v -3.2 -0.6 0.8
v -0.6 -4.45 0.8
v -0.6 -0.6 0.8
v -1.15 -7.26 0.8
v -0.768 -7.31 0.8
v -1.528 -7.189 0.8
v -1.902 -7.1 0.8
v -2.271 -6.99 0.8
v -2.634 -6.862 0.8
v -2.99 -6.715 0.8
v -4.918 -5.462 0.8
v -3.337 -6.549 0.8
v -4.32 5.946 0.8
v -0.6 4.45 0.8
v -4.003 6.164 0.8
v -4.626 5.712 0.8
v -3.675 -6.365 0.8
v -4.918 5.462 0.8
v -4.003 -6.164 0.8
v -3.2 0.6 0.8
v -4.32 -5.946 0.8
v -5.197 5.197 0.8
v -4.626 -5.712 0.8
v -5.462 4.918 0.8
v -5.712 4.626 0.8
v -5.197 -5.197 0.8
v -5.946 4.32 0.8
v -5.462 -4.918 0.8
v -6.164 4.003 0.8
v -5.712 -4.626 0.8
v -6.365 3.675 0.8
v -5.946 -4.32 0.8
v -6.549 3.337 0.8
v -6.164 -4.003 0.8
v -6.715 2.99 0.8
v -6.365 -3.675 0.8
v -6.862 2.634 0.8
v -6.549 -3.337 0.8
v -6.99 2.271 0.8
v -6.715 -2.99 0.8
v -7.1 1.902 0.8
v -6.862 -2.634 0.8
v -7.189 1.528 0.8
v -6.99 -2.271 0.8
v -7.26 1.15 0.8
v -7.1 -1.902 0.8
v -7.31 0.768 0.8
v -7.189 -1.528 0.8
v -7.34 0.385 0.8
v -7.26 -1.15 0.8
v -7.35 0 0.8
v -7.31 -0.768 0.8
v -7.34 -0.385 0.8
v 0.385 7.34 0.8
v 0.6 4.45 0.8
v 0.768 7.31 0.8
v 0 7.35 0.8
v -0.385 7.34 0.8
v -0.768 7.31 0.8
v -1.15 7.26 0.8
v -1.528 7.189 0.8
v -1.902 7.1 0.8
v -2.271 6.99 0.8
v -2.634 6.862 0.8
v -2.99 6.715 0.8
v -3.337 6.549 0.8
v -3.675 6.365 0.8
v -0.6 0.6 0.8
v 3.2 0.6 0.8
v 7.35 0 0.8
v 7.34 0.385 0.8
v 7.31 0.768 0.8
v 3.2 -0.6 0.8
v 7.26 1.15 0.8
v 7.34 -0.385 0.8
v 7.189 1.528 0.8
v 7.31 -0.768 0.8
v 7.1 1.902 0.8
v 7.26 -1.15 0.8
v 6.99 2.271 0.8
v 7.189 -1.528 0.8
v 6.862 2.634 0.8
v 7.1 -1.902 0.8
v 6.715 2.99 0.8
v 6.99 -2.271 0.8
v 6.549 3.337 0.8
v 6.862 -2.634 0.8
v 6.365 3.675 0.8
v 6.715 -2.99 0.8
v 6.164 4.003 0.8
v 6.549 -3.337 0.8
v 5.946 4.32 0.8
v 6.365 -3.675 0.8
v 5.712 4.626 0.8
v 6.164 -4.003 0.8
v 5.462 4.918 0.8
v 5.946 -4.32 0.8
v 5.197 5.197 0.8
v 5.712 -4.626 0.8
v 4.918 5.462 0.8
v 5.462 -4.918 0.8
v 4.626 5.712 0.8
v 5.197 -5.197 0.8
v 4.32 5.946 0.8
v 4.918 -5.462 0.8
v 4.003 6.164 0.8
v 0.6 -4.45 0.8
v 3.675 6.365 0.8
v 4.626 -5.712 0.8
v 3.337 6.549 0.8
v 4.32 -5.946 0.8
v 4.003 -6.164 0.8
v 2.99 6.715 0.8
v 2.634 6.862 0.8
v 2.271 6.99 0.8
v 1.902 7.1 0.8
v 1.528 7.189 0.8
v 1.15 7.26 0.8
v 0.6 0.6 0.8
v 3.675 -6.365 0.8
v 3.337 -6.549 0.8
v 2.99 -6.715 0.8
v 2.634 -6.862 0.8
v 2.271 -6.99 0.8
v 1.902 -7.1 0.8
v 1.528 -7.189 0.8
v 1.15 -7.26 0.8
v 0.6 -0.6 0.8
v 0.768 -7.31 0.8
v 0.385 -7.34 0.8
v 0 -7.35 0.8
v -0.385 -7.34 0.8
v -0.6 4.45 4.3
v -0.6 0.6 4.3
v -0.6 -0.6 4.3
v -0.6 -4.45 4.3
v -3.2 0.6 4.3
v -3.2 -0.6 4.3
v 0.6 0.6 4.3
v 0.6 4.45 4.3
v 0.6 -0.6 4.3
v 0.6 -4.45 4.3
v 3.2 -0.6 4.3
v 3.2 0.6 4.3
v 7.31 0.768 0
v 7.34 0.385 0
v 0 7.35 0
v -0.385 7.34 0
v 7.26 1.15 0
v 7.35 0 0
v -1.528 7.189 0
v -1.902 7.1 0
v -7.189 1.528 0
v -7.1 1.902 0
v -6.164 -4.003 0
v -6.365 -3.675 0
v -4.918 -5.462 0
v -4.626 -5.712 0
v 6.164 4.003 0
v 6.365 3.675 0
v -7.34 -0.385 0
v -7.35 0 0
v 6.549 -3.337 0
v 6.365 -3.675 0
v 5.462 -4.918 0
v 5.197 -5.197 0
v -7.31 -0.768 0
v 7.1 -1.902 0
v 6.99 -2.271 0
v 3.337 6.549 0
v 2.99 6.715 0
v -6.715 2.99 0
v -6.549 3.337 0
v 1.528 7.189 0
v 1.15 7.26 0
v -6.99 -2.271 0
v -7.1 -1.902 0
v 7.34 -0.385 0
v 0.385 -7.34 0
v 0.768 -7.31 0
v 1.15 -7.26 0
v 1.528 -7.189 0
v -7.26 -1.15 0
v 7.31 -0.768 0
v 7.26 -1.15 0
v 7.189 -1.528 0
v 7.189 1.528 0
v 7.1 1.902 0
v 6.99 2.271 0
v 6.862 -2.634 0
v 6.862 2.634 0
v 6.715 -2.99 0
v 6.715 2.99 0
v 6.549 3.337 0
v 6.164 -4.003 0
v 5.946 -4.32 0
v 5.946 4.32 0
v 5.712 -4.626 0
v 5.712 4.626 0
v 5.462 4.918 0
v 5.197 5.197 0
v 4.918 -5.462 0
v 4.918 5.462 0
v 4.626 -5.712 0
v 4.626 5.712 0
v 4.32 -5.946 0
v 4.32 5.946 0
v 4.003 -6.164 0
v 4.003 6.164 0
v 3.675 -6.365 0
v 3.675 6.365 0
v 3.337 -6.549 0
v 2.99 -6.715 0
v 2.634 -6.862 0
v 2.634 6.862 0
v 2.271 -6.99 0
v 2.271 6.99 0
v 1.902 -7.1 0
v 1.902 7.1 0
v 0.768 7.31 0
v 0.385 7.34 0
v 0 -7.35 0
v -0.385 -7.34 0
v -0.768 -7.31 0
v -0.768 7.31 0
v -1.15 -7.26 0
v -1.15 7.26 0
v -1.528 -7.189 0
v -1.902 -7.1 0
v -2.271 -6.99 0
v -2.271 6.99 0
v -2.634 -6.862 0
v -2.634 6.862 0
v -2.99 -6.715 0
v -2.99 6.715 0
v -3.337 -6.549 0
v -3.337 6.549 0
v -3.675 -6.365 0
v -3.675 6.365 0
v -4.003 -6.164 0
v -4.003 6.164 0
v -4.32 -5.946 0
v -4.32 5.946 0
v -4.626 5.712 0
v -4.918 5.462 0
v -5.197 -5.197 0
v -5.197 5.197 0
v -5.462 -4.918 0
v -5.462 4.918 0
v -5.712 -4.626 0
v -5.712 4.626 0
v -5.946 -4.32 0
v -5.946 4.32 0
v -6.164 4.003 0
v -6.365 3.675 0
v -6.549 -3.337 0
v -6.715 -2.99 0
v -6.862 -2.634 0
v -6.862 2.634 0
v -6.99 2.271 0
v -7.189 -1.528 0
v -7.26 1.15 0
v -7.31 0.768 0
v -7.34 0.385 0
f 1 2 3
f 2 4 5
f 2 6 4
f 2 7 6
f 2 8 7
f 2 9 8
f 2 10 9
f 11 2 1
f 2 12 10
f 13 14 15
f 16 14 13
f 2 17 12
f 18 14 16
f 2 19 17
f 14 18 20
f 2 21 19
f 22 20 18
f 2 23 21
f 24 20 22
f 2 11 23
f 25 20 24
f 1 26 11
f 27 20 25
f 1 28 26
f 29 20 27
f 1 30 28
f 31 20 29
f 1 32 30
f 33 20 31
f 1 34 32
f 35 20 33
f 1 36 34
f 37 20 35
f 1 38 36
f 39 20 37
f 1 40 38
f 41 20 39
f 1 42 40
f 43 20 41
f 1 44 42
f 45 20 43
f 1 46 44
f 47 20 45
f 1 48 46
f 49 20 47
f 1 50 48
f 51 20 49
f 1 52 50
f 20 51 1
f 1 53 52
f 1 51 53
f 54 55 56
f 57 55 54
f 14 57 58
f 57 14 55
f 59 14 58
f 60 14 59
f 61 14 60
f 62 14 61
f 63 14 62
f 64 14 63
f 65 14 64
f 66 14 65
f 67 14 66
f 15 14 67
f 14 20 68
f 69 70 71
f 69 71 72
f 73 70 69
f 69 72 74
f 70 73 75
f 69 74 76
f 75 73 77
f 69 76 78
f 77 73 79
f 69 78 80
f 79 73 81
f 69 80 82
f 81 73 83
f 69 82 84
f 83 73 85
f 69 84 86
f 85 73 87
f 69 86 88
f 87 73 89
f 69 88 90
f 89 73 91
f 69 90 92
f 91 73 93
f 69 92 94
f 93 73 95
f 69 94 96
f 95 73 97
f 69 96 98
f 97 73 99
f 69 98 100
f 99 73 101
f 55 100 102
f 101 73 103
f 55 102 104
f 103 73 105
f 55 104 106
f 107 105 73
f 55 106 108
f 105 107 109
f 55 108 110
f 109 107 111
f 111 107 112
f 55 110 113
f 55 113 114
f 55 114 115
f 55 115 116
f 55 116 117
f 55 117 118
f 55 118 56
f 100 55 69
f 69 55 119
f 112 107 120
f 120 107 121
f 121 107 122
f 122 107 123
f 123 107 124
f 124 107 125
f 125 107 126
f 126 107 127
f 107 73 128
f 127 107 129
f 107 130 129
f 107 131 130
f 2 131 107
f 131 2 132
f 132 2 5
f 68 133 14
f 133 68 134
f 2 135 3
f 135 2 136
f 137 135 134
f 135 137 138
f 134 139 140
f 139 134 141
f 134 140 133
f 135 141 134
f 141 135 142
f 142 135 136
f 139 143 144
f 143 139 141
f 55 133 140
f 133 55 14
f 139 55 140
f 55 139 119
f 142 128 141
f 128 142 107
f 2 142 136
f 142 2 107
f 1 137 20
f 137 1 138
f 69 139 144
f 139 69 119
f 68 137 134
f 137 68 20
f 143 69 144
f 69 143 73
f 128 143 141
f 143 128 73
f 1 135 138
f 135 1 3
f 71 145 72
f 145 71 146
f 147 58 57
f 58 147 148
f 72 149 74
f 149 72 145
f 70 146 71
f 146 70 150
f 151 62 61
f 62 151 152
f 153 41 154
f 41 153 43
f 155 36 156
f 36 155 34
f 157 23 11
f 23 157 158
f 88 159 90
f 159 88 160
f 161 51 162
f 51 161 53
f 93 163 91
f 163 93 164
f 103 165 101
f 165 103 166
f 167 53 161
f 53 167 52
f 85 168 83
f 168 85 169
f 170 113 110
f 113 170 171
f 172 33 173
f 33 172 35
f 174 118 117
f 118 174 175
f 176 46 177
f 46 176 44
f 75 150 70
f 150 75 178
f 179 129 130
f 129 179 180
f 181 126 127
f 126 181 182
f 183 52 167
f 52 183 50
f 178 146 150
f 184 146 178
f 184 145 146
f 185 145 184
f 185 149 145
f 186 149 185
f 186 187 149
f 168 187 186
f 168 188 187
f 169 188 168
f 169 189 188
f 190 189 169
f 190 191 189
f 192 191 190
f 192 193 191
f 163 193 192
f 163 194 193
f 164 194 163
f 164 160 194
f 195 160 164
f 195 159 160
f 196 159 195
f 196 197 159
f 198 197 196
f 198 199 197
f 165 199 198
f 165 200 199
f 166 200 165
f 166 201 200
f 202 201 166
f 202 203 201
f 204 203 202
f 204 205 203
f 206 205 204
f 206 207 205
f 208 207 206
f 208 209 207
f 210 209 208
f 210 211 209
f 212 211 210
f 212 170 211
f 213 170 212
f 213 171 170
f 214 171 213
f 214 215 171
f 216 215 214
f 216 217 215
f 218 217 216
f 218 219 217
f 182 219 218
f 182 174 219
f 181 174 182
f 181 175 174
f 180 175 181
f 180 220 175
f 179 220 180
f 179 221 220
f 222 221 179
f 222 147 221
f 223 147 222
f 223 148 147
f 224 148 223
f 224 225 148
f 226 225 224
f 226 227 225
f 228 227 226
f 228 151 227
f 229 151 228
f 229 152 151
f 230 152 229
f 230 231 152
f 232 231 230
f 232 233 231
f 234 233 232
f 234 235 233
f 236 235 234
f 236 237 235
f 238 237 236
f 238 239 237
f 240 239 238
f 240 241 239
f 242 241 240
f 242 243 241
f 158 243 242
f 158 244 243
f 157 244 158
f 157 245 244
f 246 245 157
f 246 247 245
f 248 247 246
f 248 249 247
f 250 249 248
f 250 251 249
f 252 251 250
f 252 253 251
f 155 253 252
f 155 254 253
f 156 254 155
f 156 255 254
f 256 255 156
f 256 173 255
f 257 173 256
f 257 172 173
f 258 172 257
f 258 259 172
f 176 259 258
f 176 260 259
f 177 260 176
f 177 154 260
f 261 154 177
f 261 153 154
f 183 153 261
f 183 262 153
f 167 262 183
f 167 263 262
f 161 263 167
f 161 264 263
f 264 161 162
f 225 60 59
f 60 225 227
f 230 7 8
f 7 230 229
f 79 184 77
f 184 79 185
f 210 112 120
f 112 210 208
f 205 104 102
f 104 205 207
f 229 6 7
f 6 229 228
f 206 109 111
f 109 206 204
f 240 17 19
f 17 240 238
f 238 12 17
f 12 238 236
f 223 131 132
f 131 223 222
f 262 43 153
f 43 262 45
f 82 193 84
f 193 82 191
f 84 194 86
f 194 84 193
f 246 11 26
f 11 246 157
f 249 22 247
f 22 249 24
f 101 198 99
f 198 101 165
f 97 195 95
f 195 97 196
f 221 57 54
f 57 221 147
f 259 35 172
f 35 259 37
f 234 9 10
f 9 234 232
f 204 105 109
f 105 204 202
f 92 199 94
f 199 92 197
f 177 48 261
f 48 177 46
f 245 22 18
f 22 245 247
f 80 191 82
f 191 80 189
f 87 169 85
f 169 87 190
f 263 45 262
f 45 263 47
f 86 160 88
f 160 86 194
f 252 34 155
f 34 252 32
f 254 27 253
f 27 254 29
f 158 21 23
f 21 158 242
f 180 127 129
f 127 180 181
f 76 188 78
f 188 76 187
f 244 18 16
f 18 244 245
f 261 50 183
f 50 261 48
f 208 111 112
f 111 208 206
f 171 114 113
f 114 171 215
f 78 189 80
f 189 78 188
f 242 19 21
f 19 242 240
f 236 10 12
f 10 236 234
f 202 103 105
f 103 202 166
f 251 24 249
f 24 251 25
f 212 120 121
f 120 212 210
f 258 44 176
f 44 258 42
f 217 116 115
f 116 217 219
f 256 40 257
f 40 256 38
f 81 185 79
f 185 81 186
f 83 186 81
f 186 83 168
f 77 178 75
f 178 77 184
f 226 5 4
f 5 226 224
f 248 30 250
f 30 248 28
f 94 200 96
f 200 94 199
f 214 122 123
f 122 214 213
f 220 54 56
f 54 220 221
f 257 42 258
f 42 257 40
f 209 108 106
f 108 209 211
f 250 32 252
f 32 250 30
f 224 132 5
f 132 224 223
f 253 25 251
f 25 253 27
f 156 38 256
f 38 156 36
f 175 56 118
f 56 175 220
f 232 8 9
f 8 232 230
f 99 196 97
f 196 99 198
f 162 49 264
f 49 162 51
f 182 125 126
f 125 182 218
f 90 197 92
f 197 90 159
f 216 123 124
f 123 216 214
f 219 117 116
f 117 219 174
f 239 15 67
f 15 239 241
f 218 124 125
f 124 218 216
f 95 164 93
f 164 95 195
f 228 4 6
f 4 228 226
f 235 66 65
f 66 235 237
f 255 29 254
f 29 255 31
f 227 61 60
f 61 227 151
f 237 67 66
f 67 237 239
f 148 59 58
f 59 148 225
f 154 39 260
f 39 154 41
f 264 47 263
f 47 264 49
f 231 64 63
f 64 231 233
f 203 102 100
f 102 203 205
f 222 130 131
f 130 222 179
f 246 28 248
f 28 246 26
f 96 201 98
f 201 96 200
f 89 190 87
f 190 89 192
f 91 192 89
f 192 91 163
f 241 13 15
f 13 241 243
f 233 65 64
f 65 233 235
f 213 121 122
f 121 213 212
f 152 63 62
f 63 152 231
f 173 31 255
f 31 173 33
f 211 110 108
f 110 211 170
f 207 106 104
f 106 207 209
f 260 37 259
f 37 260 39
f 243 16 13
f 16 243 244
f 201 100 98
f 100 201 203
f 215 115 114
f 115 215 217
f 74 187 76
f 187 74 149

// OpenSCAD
/*  Cam lock cover for Ikea & other cheap furniture
    Russell Salerno 2/7/2017
*/

$fn=120;

crossDepth = 3.5;
crossThickness = 1.2;
crossHeight = 8.9;
crossWidth = 6.4;

capDepth = 0.8;
capDia = 14.7;

translate([0, 0, capDepth]) linear_extrude(crossDepth) square([crossThickness, crossHeight], center=true); 
translate([0, 0, capDepth]) linear_extrude(crossDepth) square([crossWidth, crossThickness], center=true); 
linear_extrude(capDepth) circle(d=capDia, center=true);
